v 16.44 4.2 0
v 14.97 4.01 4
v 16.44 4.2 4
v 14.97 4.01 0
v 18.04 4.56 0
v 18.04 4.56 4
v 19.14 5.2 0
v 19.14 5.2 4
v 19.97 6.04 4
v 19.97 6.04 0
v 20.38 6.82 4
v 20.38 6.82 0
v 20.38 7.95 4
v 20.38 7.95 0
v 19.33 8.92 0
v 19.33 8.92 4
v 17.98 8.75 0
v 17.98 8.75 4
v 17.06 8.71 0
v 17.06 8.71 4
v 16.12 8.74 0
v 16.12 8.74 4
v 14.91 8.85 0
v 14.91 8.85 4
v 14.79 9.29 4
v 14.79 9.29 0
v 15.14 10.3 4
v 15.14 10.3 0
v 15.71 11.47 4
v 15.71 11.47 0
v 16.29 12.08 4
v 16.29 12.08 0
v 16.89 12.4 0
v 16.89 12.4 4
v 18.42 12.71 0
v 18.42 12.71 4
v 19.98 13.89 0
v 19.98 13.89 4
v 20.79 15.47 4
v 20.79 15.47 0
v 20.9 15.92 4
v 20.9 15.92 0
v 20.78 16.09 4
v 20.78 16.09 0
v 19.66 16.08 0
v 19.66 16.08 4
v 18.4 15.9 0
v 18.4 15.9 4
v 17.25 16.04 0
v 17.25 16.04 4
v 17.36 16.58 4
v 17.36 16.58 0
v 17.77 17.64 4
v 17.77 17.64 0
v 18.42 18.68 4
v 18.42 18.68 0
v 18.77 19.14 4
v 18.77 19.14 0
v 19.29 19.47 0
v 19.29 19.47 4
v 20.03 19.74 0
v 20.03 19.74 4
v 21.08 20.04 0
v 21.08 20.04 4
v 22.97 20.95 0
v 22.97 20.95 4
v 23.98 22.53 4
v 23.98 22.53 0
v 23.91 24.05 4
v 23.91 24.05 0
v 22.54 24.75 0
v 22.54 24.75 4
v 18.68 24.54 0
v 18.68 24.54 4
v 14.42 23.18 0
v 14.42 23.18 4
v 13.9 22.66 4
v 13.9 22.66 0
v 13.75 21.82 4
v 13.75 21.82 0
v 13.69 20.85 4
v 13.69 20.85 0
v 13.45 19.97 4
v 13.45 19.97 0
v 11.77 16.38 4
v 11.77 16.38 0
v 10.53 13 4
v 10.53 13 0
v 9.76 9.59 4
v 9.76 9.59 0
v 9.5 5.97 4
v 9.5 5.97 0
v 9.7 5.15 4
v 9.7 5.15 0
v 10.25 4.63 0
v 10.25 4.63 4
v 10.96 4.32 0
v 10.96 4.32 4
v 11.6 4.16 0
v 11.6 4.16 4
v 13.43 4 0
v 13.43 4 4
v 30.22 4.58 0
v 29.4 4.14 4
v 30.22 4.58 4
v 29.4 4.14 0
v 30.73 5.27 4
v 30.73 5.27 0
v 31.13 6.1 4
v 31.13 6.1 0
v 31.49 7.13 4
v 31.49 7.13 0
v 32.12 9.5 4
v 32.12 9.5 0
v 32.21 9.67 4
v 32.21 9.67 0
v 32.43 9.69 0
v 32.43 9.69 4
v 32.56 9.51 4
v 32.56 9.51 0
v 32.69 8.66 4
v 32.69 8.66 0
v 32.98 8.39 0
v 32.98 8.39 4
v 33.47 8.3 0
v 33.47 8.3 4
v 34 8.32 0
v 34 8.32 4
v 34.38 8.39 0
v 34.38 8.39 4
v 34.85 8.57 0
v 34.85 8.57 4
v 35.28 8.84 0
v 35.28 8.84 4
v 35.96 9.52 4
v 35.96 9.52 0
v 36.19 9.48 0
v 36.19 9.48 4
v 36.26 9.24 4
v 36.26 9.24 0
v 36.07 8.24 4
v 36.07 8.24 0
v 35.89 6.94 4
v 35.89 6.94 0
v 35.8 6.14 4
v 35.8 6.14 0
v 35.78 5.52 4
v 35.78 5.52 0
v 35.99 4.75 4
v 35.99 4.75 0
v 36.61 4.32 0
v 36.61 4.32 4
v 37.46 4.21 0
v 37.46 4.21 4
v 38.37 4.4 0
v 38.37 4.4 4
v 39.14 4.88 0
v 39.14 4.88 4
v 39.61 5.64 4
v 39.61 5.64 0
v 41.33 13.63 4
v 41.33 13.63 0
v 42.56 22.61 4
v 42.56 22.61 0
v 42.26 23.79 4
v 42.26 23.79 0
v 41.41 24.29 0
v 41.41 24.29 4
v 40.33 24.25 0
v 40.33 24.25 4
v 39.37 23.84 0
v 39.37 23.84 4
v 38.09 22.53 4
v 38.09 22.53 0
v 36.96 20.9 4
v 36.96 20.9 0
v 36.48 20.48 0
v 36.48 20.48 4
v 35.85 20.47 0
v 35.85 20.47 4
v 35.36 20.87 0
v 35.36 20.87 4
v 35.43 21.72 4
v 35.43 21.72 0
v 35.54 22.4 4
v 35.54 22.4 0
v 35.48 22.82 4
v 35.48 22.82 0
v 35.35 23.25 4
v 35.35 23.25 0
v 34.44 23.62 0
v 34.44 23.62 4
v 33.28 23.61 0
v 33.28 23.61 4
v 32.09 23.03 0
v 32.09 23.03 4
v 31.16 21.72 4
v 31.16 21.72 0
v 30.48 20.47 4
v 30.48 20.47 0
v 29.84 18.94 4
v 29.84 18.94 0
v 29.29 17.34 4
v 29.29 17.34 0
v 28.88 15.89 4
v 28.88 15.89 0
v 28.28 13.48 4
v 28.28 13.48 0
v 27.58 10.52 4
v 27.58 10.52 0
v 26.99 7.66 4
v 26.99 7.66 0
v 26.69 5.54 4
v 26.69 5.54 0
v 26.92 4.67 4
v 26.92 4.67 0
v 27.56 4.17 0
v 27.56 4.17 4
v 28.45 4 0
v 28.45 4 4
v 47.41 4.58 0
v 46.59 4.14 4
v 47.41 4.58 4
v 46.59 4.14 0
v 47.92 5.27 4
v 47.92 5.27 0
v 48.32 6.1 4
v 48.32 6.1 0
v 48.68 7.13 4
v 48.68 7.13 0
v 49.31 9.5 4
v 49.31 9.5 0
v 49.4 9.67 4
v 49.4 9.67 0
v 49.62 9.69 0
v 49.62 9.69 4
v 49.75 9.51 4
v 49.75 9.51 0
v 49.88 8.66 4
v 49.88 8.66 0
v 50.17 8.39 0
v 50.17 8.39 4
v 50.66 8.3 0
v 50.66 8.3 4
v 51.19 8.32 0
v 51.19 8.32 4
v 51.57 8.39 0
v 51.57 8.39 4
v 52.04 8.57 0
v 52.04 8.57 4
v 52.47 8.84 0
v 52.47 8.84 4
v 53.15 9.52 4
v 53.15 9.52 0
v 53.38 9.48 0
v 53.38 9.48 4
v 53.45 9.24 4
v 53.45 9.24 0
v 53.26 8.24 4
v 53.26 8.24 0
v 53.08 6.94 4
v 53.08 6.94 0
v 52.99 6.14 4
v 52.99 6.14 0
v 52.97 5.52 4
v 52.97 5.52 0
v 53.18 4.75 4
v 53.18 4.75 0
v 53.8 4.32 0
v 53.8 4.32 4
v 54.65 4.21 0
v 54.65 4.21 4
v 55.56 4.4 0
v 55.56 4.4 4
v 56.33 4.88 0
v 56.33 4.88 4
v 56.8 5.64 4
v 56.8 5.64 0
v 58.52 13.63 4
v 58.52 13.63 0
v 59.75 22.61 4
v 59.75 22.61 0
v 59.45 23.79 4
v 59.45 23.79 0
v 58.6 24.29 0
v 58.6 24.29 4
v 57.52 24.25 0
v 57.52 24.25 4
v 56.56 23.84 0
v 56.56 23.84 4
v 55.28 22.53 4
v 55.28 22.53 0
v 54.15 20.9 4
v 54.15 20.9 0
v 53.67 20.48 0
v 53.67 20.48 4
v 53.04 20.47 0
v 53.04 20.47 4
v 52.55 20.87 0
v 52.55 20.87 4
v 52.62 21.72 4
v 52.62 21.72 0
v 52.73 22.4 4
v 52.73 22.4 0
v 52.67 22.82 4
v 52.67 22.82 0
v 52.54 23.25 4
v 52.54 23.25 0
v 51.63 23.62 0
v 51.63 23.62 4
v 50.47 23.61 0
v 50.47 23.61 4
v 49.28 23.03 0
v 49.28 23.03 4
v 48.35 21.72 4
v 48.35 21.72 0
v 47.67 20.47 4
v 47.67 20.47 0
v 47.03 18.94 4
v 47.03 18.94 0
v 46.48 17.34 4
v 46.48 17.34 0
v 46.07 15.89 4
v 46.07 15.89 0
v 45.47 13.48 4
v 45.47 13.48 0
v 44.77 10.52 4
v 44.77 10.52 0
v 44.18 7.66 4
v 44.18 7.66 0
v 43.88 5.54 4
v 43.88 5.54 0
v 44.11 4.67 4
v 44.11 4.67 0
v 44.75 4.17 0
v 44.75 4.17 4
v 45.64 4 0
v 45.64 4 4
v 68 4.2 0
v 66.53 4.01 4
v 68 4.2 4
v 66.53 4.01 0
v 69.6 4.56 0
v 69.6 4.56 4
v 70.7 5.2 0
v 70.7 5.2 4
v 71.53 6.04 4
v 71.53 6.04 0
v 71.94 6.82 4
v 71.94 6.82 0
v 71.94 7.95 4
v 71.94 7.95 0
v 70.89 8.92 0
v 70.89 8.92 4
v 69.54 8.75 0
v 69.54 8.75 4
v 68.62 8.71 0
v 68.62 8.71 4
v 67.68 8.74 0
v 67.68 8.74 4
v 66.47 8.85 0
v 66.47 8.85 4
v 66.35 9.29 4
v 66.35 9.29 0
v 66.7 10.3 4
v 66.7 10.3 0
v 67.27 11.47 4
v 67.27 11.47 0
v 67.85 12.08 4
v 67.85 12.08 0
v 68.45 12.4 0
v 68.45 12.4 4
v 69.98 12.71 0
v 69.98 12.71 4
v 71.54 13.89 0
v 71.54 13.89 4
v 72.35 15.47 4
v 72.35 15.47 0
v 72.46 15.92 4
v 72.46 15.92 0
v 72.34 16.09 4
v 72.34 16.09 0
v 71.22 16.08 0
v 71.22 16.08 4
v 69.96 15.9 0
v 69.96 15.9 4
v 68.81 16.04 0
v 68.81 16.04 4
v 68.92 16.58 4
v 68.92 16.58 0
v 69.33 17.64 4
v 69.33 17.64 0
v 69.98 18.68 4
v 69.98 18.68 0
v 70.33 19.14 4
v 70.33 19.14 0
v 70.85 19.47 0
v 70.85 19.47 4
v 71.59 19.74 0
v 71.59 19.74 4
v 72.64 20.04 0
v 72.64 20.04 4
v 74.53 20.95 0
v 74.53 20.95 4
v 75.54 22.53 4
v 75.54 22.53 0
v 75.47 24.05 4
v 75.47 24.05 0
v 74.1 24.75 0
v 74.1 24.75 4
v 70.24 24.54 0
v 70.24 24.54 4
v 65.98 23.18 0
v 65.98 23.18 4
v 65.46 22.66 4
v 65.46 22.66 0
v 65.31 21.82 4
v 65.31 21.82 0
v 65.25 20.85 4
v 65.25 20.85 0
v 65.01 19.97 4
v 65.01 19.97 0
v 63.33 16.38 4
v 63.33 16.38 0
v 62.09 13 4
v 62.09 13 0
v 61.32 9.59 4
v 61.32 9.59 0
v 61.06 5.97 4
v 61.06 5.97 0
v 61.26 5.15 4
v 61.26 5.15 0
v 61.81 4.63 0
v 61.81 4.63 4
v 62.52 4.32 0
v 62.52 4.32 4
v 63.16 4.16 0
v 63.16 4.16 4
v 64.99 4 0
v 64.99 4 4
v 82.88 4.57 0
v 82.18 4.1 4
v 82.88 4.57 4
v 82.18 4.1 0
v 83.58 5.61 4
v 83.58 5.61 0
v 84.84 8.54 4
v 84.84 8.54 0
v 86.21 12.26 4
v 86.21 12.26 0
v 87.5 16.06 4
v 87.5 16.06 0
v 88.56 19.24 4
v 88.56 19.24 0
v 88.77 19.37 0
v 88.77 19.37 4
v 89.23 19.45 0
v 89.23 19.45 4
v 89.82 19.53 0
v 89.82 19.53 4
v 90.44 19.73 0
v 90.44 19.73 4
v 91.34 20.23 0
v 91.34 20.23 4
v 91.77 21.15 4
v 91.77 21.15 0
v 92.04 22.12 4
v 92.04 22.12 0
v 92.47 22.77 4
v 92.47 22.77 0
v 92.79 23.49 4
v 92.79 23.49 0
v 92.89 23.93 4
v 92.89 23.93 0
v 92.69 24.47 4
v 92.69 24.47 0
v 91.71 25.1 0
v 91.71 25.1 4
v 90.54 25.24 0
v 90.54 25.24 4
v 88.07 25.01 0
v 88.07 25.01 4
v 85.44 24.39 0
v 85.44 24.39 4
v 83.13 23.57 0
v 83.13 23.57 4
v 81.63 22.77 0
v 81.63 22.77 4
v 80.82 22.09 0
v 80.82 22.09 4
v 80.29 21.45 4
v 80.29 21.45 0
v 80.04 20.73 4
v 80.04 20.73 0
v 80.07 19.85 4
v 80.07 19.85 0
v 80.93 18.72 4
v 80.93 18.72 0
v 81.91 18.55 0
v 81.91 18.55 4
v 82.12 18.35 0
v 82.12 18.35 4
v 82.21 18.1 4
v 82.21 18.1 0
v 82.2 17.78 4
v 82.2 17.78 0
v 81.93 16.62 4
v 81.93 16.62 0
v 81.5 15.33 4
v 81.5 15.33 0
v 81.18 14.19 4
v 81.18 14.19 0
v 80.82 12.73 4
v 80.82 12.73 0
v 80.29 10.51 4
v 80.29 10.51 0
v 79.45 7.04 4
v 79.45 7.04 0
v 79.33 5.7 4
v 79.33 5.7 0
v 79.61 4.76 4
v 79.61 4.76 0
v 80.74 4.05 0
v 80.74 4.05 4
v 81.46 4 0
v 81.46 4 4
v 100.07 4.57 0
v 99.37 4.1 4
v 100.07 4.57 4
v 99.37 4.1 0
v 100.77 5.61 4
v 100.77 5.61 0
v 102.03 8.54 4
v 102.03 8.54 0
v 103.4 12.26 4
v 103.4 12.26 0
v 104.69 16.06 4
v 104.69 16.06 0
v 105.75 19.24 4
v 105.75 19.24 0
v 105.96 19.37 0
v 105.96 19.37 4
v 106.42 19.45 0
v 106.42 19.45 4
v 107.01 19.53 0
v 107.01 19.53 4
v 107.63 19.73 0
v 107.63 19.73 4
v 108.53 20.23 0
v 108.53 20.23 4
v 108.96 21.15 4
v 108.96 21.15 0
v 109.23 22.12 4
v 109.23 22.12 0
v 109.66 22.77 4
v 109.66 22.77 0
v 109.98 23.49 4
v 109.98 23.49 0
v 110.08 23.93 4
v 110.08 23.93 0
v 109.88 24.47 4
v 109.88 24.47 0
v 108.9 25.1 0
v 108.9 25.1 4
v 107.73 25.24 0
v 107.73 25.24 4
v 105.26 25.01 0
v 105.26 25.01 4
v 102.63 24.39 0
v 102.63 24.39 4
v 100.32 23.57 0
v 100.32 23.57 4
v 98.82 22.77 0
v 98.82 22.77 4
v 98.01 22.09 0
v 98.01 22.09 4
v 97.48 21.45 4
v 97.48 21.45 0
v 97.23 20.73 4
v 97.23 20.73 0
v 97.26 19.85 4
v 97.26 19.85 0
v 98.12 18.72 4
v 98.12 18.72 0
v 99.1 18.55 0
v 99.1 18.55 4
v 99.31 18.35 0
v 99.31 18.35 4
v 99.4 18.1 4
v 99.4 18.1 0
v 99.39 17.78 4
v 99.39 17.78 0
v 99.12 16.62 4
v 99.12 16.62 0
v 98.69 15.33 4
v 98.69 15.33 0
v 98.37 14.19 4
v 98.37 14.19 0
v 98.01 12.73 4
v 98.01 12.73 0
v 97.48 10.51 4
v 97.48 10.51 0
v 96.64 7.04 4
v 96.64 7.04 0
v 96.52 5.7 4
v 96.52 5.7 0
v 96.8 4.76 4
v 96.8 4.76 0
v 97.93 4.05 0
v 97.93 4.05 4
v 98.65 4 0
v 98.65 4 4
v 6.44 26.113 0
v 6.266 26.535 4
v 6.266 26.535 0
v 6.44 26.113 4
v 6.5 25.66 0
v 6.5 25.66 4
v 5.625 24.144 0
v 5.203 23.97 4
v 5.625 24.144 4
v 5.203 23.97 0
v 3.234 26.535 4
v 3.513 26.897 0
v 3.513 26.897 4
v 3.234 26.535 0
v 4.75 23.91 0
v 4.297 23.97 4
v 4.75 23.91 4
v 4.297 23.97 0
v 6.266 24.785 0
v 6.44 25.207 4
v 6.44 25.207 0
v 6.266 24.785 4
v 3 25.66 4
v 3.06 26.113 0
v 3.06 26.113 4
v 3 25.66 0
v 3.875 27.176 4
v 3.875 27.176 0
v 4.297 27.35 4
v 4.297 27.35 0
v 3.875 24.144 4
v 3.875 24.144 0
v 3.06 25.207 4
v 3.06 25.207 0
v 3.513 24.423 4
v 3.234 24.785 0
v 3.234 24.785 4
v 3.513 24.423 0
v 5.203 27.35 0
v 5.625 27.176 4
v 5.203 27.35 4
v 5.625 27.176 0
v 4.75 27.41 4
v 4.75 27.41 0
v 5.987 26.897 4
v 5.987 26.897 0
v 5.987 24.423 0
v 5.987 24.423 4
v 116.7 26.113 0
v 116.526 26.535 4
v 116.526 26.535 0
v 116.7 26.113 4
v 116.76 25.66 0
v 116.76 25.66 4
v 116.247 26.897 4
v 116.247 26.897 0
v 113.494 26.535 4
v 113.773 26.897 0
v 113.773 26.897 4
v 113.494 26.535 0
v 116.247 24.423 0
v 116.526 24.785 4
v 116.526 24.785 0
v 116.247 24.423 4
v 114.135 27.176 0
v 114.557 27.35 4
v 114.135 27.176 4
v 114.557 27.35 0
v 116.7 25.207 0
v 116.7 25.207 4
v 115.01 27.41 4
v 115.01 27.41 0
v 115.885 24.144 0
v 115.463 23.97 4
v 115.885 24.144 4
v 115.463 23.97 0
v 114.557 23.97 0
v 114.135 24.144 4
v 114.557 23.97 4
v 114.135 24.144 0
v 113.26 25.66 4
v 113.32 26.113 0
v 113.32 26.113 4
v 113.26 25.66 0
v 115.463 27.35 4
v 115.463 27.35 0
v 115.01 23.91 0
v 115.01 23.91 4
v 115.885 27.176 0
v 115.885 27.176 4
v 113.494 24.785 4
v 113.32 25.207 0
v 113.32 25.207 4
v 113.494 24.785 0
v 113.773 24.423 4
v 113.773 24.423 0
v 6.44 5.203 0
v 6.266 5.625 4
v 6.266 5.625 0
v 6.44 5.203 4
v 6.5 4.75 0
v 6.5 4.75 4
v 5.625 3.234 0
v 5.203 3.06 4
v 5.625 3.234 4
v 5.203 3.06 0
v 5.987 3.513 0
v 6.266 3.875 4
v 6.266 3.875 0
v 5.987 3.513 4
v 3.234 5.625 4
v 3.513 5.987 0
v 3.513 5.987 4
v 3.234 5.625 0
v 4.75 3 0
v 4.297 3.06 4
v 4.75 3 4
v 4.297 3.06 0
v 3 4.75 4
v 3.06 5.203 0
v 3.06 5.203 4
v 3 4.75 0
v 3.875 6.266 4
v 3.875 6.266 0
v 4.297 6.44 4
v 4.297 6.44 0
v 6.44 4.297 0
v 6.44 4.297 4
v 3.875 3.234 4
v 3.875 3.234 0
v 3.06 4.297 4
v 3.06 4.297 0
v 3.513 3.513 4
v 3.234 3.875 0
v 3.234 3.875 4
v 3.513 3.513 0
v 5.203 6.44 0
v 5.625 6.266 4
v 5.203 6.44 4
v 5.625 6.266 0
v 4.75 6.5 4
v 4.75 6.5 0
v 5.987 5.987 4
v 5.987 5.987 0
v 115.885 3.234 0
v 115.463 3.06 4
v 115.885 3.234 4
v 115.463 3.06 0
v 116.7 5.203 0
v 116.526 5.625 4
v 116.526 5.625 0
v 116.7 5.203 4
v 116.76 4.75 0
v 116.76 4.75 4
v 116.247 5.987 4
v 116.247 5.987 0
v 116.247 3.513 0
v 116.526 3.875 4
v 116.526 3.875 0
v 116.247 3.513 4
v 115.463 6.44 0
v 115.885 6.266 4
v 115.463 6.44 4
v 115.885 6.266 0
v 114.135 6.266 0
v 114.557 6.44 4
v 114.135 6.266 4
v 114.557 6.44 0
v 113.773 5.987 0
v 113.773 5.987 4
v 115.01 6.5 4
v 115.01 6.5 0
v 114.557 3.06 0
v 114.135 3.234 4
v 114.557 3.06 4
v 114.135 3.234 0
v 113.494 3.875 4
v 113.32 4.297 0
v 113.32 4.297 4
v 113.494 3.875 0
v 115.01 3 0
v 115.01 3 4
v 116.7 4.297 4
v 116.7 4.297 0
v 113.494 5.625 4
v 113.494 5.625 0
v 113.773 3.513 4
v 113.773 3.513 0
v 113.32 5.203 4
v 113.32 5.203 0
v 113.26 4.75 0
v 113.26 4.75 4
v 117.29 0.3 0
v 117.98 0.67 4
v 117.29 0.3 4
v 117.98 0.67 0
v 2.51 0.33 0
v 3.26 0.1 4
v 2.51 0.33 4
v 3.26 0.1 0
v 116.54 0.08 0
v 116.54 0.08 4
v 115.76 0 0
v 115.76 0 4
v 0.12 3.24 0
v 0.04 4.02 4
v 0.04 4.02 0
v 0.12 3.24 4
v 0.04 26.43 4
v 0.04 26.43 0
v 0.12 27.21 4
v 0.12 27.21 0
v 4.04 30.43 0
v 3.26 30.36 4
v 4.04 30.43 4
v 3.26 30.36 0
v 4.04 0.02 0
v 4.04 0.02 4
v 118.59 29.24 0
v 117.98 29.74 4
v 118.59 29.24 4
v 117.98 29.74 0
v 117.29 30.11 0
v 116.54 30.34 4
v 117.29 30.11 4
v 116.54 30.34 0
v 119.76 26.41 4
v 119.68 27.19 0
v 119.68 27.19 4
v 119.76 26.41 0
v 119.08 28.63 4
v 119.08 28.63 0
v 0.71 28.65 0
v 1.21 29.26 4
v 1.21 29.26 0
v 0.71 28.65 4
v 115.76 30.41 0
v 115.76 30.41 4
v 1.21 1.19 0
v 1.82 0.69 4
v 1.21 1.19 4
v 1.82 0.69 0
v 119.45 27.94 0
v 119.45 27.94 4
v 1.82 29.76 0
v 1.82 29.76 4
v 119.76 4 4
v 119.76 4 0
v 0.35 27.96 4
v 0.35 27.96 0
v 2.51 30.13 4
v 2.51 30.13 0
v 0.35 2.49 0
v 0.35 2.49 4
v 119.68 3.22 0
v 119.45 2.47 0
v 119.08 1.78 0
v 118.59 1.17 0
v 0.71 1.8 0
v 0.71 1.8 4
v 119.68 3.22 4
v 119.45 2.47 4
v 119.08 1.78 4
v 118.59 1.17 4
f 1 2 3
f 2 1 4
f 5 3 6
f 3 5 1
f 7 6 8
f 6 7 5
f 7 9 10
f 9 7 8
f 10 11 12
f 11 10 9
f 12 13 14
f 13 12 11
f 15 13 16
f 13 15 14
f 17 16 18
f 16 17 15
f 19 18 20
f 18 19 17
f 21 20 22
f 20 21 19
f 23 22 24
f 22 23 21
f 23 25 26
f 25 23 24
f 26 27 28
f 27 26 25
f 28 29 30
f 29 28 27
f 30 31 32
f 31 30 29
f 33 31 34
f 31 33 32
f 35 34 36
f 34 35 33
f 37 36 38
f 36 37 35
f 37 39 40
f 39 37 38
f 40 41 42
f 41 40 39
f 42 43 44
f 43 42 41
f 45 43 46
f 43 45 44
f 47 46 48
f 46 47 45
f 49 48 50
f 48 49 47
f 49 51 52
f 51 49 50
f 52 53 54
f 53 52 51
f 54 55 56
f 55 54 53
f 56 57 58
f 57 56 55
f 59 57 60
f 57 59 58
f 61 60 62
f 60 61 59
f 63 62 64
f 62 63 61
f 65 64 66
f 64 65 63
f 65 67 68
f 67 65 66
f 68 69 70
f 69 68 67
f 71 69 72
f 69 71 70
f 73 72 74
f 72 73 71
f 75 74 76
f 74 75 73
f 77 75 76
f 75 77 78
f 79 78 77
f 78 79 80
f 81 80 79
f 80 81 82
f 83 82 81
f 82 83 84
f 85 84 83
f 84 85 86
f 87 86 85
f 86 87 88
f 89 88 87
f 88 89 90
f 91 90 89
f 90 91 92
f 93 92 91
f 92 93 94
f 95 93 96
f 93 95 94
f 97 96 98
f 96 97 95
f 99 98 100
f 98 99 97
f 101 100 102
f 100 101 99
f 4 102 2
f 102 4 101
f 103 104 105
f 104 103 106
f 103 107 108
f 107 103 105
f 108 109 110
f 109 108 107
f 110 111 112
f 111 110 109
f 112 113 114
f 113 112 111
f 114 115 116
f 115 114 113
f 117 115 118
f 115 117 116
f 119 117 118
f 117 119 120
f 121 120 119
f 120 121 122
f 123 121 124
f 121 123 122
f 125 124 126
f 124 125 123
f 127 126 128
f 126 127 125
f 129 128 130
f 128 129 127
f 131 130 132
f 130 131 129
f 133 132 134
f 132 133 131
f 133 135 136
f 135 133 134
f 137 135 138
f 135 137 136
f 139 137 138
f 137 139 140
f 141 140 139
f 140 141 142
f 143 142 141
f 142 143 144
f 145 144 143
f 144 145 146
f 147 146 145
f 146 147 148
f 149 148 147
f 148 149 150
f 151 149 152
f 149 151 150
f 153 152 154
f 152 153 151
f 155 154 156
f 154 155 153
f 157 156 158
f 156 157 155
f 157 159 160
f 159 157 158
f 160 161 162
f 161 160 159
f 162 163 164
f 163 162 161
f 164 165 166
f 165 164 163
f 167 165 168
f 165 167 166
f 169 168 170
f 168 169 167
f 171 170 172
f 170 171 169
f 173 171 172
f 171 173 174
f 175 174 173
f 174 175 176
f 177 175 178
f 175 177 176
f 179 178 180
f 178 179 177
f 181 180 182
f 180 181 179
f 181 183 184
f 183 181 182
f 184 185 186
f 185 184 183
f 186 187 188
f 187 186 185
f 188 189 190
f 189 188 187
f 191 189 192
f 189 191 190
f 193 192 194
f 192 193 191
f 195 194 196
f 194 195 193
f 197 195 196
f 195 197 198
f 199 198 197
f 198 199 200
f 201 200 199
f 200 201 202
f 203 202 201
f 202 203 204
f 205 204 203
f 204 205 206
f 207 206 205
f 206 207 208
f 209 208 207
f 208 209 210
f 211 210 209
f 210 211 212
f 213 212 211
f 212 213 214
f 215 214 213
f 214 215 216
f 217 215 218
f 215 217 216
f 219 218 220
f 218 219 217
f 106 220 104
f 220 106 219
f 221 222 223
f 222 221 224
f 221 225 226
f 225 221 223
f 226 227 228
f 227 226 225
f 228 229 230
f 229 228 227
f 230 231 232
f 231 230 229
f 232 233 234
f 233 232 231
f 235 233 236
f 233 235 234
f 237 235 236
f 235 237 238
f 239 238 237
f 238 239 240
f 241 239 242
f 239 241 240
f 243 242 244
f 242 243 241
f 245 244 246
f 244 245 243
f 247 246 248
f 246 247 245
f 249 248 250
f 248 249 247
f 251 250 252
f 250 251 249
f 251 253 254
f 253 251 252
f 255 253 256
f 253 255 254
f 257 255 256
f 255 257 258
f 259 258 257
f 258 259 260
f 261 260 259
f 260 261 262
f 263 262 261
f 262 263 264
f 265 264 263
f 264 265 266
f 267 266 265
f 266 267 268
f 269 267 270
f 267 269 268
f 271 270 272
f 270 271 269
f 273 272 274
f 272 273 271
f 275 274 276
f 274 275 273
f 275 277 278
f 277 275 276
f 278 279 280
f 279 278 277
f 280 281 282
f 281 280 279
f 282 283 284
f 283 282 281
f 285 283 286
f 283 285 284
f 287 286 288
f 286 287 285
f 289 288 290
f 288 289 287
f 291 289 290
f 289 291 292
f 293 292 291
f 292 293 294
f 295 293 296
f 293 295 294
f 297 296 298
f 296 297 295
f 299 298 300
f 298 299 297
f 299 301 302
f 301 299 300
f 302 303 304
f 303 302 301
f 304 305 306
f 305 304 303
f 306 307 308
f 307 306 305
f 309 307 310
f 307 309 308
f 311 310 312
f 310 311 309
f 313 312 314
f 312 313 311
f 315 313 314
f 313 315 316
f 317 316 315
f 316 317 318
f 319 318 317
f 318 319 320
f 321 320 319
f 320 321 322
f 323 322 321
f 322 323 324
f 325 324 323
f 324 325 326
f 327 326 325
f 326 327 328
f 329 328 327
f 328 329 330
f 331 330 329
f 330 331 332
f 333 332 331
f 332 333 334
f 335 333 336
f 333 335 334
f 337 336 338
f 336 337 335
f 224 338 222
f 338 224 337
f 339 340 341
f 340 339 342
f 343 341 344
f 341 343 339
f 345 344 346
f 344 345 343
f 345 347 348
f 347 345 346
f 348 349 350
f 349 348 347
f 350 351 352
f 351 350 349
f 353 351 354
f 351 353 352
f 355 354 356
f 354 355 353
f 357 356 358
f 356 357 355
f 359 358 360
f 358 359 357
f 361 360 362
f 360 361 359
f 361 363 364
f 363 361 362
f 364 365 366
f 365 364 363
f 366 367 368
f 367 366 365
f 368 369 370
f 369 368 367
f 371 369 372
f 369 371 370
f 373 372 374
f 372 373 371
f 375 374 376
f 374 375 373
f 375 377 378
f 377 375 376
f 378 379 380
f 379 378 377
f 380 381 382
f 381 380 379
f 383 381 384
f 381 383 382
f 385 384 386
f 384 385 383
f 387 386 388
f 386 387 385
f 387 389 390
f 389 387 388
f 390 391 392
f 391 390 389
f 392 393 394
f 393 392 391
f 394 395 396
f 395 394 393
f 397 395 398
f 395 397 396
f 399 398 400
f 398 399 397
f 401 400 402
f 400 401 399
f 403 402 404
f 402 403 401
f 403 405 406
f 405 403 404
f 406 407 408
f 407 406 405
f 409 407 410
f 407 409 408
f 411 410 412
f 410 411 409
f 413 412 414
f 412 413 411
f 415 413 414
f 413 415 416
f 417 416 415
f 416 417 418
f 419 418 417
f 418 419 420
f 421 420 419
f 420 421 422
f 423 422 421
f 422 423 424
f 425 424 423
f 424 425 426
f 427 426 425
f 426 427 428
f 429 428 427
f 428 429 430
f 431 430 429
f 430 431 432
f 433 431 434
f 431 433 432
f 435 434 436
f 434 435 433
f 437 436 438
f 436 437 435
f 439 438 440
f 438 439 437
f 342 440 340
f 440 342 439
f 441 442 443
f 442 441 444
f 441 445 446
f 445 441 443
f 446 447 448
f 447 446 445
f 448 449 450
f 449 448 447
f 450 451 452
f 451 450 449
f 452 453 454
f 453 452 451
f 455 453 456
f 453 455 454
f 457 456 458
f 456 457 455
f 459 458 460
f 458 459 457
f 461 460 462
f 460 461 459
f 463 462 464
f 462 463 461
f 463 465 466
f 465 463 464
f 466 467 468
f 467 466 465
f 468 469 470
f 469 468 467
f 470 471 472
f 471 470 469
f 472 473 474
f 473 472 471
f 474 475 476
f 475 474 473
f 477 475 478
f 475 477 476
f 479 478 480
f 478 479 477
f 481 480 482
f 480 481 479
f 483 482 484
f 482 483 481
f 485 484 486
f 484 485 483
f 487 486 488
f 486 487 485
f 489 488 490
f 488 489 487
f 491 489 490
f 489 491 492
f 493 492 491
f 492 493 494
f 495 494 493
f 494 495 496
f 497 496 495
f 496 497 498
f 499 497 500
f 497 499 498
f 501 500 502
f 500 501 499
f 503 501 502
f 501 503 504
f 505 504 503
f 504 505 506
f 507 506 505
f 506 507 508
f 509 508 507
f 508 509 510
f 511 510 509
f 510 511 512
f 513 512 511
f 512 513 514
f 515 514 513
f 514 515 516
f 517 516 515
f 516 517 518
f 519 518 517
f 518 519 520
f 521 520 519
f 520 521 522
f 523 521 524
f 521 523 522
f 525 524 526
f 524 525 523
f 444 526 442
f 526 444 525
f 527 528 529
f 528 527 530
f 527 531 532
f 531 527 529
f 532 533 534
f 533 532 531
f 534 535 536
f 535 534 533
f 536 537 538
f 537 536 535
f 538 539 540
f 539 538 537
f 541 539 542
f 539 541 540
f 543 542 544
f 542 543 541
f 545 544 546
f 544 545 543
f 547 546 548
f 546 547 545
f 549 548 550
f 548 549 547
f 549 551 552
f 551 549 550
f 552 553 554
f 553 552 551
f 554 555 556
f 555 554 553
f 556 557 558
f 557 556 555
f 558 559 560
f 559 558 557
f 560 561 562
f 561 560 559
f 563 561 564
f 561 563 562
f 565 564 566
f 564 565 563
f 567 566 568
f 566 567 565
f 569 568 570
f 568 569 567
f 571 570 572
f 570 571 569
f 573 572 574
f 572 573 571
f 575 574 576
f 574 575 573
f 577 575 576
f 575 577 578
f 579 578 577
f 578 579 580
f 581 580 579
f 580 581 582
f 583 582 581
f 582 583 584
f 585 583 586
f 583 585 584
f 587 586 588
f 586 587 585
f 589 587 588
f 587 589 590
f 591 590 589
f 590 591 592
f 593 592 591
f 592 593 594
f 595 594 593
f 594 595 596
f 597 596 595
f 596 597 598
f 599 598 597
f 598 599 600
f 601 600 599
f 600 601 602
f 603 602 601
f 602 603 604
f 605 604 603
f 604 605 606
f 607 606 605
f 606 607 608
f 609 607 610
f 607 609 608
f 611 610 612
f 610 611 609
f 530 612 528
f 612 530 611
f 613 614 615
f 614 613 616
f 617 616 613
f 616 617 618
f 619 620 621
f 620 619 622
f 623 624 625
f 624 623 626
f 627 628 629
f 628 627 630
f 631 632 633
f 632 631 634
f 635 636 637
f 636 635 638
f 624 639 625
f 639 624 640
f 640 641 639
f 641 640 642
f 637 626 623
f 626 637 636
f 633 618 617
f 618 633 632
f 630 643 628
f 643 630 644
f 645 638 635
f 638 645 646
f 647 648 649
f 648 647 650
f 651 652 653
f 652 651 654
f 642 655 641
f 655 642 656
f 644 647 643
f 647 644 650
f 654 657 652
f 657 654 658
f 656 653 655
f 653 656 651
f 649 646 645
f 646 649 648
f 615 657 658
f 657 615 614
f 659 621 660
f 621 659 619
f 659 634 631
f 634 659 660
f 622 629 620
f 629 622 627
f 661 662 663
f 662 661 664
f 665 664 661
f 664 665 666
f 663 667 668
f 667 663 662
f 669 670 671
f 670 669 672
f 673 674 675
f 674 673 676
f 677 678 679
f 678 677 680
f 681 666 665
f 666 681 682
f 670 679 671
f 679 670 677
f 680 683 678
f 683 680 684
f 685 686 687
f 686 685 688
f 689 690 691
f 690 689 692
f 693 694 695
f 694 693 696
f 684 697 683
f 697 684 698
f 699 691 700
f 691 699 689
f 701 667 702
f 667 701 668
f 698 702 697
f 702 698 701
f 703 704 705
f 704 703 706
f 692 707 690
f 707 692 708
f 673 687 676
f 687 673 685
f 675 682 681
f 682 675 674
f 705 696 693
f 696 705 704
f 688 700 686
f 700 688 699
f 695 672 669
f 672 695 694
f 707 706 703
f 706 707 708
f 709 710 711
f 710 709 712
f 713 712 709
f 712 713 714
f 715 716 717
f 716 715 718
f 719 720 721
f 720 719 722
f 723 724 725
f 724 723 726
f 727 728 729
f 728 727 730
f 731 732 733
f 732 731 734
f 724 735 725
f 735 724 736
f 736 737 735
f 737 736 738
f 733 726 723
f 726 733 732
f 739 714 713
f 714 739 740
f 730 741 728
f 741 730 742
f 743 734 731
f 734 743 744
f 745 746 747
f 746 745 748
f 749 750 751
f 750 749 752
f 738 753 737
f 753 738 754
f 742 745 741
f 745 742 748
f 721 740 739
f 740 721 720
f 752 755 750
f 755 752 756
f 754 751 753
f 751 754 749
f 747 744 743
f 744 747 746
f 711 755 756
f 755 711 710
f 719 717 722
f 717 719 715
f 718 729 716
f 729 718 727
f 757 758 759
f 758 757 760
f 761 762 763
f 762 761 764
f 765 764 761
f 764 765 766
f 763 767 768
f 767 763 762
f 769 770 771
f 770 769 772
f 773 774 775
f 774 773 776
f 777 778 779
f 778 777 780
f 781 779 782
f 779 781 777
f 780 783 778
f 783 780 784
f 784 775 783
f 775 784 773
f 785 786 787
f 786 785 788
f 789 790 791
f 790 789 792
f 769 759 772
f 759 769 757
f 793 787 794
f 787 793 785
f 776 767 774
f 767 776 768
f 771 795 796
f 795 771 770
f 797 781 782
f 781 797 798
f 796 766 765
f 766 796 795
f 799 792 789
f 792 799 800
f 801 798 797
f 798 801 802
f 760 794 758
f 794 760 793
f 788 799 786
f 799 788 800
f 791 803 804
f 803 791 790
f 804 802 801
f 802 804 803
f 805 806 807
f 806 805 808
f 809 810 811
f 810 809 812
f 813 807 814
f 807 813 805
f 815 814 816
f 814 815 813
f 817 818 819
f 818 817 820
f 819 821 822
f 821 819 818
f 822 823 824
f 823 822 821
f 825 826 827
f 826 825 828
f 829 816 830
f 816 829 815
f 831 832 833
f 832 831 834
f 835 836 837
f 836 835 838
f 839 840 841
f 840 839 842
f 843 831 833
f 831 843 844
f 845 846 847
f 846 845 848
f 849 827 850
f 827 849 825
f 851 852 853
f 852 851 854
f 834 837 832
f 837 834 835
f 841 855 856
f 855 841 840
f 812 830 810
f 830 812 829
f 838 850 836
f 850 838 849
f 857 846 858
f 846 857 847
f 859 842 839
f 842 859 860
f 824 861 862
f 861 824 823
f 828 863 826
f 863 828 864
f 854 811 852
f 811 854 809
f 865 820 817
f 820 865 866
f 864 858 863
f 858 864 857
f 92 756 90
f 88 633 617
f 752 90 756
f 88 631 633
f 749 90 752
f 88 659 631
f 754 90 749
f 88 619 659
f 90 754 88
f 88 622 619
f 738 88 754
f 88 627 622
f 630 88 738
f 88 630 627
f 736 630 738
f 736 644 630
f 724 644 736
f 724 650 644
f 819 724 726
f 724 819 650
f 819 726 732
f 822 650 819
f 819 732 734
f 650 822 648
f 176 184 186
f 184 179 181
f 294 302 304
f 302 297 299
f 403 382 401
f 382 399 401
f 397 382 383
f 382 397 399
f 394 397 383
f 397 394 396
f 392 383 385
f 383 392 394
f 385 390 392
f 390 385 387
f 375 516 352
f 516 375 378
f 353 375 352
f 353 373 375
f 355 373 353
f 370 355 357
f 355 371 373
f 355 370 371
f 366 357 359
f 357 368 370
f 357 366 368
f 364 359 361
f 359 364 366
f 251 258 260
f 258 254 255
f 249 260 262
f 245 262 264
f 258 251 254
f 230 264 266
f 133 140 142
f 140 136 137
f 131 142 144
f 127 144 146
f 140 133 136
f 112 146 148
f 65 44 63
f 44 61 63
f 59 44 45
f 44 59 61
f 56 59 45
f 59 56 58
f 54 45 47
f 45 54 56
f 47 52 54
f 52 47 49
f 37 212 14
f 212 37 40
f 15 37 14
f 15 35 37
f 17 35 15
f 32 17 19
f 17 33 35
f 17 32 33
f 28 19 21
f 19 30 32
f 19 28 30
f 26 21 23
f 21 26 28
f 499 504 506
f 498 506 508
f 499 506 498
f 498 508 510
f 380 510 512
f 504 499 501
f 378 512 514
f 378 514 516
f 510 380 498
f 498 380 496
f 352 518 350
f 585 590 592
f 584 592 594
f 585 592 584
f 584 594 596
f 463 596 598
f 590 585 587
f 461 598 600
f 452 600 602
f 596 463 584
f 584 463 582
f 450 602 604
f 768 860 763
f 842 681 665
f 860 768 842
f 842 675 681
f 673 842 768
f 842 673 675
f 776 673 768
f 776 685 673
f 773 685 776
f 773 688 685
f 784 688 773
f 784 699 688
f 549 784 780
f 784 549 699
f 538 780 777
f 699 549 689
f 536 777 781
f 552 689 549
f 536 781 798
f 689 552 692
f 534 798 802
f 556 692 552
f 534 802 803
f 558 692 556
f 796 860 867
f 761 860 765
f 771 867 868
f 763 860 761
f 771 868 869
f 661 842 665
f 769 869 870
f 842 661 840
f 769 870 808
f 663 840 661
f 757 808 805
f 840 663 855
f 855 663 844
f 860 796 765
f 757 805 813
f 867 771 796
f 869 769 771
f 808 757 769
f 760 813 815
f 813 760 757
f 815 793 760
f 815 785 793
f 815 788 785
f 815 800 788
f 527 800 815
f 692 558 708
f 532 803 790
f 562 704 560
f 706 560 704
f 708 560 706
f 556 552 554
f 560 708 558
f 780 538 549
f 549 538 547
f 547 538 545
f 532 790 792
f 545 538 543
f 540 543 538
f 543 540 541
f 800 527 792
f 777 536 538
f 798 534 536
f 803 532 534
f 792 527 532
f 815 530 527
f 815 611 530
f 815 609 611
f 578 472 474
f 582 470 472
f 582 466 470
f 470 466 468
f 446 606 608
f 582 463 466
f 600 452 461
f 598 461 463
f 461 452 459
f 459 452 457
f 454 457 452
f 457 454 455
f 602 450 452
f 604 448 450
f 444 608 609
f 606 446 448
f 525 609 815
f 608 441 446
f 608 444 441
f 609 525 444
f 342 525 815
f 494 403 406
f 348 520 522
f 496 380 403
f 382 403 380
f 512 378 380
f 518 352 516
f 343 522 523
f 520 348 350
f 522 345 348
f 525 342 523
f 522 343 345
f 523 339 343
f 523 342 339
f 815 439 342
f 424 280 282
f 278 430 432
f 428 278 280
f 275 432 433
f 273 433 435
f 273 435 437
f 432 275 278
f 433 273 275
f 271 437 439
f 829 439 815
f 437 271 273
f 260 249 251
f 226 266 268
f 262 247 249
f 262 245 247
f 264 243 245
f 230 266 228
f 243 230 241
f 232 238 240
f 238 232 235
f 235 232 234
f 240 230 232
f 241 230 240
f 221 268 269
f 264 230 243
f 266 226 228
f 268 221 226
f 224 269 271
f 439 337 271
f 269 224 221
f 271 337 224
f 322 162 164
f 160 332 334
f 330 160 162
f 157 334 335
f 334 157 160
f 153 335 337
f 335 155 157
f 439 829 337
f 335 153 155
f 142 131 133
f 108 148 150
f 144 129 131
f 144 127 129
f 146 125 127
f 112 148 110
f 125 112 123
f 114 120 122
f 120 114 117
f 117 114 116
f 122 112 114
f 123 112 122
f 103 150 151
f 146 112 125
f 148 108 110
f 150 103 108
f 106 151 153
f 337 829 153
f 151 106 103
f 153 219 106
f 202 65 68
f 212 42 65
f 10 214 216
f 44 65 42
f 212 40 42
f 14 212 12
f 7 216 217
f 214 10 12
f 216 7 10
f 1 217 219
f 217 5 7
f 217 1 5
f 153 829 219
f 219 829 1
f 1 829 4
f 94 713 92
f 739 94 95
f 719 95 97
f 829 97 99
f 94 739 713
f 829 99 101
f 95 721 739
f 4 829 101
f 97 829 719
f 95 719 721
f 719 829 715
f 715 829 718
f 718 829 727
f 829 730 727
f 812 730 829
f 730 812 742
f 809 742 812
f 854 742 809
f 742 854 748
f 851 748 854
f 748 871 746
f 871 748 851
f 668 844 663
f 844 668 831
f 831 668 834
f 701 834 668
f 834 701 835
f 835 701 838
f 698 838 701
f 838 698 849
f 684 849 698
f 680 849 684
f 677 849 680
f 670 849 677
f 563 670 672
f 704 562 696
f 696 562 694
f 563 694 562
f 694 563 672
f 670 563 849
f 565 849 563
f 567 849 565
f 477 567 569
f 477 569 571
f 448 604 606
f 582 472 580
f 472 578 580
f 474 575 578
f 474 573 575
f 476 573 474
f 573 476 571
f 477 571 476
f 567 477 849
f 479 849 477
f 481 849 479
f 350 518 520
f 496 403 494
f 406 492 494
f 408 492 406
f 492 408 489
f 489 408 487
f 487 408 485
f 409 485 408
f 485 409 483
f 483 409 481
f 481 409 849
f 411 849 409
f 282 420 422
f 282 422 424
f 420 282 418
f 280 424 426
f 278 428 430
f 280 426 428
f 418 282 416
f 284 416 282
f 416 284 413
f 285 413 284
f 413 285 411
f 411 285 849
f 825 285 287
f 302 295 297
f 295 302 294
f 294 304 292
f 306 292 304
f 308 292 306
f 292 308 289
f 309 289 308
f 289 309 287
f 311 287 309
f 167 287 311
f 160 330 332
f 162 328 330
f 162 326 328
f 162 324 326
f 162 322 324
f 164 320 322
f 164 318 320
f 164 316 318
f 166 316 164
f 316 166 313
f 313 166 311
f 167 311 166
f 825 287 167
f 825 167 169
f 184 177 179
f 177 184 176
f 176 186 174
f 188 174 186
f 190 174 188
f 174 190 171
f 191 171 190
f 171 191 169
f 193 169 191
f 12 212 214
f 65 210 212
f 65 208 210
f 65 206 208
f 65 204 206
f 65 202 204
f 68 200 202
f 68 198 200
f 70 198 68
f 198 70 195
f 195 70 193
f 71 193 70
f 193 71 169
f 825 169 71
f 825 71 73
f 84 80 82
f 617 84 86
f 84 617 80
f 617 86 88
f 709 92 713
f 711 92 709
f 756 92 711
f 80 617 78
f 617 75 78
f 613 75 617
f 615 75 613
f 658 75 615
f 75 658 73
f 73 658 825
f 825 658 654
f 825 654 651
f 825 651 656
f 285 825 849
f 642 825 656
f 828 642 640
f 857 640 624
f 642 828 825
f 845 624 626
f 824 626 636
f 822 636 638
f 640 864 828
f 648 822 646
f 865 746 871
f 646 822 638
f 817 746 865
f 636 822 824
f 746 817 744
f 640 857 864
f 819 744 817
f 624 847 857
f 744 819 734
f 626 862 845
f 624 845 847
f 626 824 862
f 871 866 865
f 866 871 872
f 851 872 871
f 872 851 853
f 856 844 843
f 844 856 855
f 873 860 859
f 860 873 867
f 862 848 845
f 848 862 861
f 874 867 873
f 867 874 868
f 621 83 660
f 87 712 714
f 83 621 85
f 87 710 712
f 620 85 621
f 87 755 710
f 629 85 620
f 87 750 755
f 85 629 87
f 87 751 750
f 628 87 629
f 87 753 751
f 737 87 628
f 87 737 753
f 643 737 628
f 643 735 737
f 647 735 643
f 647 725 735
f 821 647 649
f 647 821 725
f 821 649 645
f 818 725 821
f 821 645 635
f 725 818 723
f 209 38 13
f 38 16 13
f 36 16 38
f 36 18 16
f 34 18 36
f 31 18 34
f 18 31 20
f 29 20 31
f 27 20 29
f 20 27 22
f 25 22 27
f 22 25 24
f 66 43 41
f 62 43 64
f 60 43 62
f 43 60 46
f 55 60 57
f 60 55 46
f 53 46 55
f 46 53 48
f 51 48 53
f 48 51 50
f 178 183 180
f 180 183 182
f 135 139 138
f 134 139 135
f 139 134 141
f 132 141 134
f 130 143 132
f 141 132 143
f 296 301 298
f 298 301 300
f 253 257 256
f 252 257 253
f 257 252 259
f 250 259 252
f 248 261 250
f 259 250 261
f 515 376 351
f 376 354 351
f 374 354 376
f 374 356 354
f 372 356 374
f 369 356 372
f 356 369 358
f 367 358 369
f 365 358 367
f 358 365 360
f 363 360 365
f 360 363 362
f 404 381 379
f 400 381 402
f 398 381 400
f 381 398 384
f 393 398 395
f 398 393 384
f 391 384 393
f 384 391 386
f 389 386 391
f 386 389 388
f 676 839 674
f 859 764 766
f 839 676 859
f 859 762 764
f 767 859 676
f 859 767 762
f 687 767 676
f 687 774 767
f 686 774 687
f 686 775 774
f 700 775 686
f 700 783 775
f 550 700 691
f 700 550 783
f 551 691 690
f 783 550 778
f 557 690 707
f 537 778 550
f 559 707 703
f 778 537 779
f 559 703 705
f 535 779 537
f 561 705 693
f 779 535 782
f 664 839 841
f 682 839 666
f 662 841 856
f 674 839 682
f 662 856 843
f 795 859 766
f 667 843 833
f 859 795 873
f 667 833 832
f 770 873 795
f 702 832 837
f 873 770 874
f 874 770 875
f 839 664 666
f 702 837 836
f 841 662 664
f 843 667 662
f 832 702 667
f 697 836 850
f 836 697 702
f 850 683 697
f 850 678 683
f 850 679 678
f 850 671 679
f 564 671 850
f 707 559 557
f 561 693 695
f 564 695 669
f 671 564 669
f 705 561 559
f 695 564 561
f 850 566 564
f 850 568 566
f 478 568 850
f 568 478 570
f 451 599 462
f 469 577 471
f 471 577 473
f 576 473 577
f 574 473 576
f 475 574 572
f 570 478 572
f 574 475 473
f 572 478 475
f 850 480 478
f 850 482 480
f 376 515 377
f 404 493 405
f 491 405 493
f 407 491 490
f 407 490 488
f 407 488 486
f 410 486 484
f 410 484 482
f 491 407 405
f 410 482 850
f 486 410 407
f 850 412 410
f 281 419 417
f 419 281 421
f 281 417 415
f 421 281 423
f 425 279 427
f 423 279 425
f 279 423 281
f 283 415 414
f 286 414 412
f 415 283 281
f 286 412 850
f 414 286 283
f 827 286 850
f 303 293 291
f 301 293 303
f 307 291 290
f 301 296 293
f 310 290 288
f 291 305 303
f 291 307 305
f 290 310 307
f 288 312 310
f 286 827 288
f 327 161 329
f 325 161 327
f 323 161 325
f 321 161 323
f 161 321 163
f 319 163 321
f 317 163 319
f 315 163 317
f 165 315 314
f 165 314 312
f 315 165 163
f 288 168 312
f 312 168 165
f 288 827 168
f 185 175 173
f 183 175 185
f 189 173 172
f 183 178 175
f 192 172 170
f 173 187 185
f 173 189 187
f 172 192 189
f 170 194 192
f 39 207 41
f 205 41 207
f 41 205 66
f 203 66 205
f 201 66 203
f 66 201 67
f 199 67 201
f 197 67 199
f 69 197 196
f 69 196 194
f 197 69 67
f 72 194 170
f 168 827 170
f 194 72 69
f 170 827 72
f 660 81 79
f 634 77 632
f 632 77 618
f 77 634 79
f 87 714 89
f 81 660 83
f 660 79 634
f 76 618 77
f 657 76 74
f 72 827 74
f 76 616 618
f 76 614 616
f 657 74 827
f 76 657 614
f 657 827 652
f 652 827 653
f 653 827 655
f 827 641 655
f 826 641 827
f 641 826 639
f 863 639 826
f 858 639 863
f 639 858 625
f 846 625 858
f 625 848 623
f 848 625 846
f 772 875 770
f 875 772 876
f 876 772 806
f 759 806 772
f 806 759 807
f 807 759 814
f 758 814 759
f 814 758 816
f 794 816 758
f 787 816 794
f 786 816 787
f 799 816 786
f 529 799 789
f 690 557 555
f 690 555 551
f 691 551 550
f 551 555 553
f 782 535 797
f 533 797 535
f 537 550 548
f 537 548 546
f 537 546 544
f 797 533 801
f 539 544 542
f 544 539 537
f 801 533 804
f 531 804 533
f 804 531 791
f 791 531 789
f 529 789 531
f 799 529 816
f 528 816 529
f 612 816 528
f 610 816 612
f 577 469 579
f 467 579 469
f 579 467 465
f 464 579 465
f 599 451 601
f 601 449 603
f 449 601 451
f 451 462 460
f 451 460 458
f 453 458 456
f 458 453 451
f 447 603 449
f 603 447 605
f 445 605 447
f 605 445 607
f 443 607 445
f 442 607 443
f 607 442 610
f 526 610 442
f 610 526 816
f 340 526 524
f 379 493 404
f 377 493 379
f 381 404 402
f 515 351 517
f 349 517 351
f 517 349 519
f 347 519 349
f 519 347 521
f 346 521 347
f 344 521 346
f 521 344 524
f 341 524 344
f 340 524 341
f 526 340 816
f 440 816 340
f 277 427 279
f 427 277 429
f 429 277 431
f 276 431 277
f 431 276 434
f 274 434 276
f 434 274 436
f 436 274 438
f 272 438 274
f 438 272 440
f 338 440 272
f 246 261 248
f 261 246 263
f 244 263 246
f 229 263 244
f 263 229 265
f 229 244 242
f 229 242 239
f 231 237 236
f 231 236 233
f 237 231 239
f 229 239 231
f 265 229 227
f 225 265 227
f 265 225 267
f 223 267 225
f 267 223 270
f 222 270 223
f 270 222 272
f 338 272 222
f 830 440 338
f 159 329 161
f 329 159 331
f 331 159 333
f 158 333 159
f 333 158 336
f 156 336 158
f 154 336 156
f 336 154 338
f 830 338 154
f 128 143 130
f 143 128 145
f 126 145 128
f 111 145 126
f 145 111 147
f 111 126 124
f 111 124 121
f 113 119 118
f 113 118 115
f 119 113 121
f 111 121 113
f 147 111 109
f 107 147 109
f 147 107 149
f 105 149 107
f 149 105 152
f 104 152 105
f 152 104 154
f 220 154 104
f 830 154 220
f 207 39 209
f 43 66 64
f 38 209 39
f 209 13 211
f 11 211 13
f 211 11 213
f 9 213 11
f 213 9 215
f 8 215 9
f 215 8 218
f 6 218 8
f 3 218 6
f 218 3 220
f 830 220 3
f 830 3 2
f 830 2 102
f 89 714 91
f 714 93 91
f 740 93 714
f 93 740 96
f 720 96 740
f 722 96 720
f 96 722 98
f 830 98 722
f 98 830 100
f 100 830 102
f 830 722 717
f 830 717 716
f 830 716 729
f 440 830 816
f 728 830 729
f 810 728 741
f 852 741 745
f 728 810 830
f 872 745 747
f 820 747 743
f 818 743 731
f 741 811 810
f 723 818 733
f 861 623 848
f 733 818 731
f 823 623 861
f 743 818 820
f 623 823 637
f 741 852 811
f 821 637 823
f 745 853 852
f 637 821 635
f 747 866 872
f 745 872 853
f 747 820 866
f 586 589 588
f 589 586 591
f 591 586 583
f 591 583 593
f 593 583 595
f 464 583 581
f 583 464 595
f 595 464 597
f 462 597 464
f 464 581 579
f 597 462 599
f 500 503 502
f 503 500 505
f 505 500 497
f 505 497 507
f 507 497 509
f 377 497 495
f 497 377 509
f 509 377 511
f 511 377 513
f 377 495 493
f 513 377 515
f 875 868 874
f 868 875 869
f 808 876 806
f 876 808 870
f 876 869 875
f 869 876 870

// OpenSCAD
//Name Plate or Blank for Emmett Delta
//By: David Bunch 12/1/2015

Ht = 4;
M3 = 3.5;
$fn=24;
Type = 2;           //1 = Blank, 2 = Name Plate

module Plate(PL_Ht = Ht)
{
    linear_extrude(height = PL_Ht, center = false, convexity = 10)polygon(points = 
    [[0.12,3.24],[0.35,2.49],[0.71,1.8],[1.21,1.19],[1.82,0.69],
    [2.51,0.33],[3.26,0.1],[4.04,0.02],[115.76,0],[116.54,0.08],
    [117.29,0.3],[117.98,0.67],[118.59,1.17],[119.08,1.78],[119.45,2.47],
    [119.68,3.22],[119.76,4],[119.76,26.41],[119.68,27.19],[119.45,27.94],
    [119.08,28.63],[118.59,29.24],[117.98,29.74],[117.29,30.11],[116.54,30.34],
    [115.76,30.41],[4.04,30.43],[3.26,30.36],[2.51,30.13],[1.82,29.76],
    [1.21,29.26],[0.71,28.65],[0.35,27.96],[0.12,27.21],[0.04,26.43],
    [0.04,4.02]]);
}
module Holes()
{
    translate([4.75,25.66,-1])
    cylinder(d=M3,h=Ht+2);
    translate([115.01,25.66,-1])
    cylinder(d=M3,h=Ht+2);
    translate([4.75,4.75,-1])
    cylinder(d=M3,h=Ht+2);
    translate([115.01,4.75,-1])
    cylinder(d=M3,h=Ht+2);
}
module E_Let()
{
    linear_extrude(height = Ht+2, center = false, convexity = 10)polygon(points = 
    [[9.7,5.15],[10.25,4.63],[10.96,4.32],[11.6,4.16],[13.43,4],
    [14.97,4.01],[16.44,4.2],[18.04,4.56],[19.14,5.2],[19.97,6.04],
    [20.38,6.82],[20.38,7.95],[19.33,8.92],[17.98,8.75],[17.06,8.71],
    [16.12,8.74],[14.91,8.85],[14.79,9.29],[15.14,10.3],[15.71,11.47],
    [16.29,12.08],[16.89,12.4],[18.42,12.71],[19.98,13.89],[20.79,15.47],
    [20.9,15.92],[20.78,16.09],[19.66,16.08],[18.4,15.9],[17.25,16.04],
    [17.36,16.58],[17.77,17.64],[18.42,18.68],[18.77,19.14],[19.29,19.47],
    [20.03,19.74],[21.08,20.04],[22.97,20.95],[23.98,22.53],[23.91,24.05],
    [22.54,24.75],[18.68,24.54],[14.42,23.18],[13.9,22.66],[13.75,21.82],
    [13.69,20.85],[13.45,19.97],[11.77,16.38],[10.53,13],[9.76,9.59],
    [9.5,5.97]]);
}
module M_Let()
{
    linear_extrude(height = Ht+2, center = false, convexity = 10)polygon(points = 
    [[26.99,7.66],[26.69,5.54],[26.92,4.67],[27.56,4.17],[28.45,4],
    [29.4,4.14],[30.22,4.58],[30.73,5.27],[31.13,6.1],[31.49,7.13],
    [32.12,9.5],[32.21,9.67],[32.43,9.69],[32.56,9.51],[32.69,8.66],
    [32.98,8.39],[33.47,8.3],[34,8.32],[34.38,8.39],[34.85,8.57],
    [35.28,8.84],[35.96,9.52],[36.19,9.48],[36.26,9.24],[36.07,8.24],
    [35.89,6.94],[35.8,6.14],[35.78,5.52],[35.99,4.75],[36.61,4.32],
    [37.46,4.21],[38.37,4.4],[39.14,4.88],[39.61,5.64],[41.33,13.63],
    [42.56,22.61],[42.26,23.79],[41.41,24.29],[40.33,24.25],[39.37,23.84],
    [38.09,22.53],[36.96,20.9],[36.48,20.48],[35.85,20.47],[35.36,20.87],
    [35.43,21.72],[35.54,22.4],[35.48,22.82],[35.35,23.25],[34.44,23.62],
    [33.28,23.61],[32.09,23.03],[31.16,21.72],[30.48,20.47],[29.84,18.94],
    [29.29,17.34],[28.88,15.89],[28.28,13.48],[27.58,10.52]]);
}
module T_Let()
{
    linear_extrude(height = Ht+2, center = false, convexity = 10)polygon(points = 
    [[79.45,7.04],[79.33,5.7],[79.61,4.76],[80.74,4.05],[81.46,4],
    [82.18,4.1],[82.88,4.57],[83.58,5.61],[84.84,8.54],[86.21,12.26],
    [87.5,16.06],[88.56,19.24],[88.77,19.37],[89.23,19.45],[89.82,19.53],
    [90.44,19.73],[91.34,20.23],[91.77,21.15],[92.04,22.12],[92.47,22.77],
    [92.79,23.49],[92.89,23.93],[92.69,24.47],[91.71,25.1],[90.54,25.24],
    [88.07,25.01],[85.44,24.39],[83.13,23.57],[81.63,22.77],[80.82,22.09],
    [80.29,21.45],[80.04,20.73],[80.07,19.85],[80.93,18.72],[81.91,18.55],
    [82.12,18.35],[82.21,18.1],[82.2,17.78],[81.93,16.62],[81.5,15.33],
    [81.18,14.19],[80.82,12.73],[80.29,10.51]]);
}
module DrawName()
{
    difference()
    {
        translate([0,0,0])
        Plate(Ht);
        translate([0,0,-1])
        {
            E_Let();
            M_Let();
            translate([17.19,0,0])
            M_Let();
            translate([51.56,0,0])
            E_Let();
            T_Let();
            translate([17.19,0,0])
            T_Let();
        }
        Holes();
    }
}
module DrawBlank()
{
    difference()
    {
        Plate(2);
        Holes();
    }
}
if (Type == 1)
{
    DrawBlank();
} else {
    DrawName();
}
